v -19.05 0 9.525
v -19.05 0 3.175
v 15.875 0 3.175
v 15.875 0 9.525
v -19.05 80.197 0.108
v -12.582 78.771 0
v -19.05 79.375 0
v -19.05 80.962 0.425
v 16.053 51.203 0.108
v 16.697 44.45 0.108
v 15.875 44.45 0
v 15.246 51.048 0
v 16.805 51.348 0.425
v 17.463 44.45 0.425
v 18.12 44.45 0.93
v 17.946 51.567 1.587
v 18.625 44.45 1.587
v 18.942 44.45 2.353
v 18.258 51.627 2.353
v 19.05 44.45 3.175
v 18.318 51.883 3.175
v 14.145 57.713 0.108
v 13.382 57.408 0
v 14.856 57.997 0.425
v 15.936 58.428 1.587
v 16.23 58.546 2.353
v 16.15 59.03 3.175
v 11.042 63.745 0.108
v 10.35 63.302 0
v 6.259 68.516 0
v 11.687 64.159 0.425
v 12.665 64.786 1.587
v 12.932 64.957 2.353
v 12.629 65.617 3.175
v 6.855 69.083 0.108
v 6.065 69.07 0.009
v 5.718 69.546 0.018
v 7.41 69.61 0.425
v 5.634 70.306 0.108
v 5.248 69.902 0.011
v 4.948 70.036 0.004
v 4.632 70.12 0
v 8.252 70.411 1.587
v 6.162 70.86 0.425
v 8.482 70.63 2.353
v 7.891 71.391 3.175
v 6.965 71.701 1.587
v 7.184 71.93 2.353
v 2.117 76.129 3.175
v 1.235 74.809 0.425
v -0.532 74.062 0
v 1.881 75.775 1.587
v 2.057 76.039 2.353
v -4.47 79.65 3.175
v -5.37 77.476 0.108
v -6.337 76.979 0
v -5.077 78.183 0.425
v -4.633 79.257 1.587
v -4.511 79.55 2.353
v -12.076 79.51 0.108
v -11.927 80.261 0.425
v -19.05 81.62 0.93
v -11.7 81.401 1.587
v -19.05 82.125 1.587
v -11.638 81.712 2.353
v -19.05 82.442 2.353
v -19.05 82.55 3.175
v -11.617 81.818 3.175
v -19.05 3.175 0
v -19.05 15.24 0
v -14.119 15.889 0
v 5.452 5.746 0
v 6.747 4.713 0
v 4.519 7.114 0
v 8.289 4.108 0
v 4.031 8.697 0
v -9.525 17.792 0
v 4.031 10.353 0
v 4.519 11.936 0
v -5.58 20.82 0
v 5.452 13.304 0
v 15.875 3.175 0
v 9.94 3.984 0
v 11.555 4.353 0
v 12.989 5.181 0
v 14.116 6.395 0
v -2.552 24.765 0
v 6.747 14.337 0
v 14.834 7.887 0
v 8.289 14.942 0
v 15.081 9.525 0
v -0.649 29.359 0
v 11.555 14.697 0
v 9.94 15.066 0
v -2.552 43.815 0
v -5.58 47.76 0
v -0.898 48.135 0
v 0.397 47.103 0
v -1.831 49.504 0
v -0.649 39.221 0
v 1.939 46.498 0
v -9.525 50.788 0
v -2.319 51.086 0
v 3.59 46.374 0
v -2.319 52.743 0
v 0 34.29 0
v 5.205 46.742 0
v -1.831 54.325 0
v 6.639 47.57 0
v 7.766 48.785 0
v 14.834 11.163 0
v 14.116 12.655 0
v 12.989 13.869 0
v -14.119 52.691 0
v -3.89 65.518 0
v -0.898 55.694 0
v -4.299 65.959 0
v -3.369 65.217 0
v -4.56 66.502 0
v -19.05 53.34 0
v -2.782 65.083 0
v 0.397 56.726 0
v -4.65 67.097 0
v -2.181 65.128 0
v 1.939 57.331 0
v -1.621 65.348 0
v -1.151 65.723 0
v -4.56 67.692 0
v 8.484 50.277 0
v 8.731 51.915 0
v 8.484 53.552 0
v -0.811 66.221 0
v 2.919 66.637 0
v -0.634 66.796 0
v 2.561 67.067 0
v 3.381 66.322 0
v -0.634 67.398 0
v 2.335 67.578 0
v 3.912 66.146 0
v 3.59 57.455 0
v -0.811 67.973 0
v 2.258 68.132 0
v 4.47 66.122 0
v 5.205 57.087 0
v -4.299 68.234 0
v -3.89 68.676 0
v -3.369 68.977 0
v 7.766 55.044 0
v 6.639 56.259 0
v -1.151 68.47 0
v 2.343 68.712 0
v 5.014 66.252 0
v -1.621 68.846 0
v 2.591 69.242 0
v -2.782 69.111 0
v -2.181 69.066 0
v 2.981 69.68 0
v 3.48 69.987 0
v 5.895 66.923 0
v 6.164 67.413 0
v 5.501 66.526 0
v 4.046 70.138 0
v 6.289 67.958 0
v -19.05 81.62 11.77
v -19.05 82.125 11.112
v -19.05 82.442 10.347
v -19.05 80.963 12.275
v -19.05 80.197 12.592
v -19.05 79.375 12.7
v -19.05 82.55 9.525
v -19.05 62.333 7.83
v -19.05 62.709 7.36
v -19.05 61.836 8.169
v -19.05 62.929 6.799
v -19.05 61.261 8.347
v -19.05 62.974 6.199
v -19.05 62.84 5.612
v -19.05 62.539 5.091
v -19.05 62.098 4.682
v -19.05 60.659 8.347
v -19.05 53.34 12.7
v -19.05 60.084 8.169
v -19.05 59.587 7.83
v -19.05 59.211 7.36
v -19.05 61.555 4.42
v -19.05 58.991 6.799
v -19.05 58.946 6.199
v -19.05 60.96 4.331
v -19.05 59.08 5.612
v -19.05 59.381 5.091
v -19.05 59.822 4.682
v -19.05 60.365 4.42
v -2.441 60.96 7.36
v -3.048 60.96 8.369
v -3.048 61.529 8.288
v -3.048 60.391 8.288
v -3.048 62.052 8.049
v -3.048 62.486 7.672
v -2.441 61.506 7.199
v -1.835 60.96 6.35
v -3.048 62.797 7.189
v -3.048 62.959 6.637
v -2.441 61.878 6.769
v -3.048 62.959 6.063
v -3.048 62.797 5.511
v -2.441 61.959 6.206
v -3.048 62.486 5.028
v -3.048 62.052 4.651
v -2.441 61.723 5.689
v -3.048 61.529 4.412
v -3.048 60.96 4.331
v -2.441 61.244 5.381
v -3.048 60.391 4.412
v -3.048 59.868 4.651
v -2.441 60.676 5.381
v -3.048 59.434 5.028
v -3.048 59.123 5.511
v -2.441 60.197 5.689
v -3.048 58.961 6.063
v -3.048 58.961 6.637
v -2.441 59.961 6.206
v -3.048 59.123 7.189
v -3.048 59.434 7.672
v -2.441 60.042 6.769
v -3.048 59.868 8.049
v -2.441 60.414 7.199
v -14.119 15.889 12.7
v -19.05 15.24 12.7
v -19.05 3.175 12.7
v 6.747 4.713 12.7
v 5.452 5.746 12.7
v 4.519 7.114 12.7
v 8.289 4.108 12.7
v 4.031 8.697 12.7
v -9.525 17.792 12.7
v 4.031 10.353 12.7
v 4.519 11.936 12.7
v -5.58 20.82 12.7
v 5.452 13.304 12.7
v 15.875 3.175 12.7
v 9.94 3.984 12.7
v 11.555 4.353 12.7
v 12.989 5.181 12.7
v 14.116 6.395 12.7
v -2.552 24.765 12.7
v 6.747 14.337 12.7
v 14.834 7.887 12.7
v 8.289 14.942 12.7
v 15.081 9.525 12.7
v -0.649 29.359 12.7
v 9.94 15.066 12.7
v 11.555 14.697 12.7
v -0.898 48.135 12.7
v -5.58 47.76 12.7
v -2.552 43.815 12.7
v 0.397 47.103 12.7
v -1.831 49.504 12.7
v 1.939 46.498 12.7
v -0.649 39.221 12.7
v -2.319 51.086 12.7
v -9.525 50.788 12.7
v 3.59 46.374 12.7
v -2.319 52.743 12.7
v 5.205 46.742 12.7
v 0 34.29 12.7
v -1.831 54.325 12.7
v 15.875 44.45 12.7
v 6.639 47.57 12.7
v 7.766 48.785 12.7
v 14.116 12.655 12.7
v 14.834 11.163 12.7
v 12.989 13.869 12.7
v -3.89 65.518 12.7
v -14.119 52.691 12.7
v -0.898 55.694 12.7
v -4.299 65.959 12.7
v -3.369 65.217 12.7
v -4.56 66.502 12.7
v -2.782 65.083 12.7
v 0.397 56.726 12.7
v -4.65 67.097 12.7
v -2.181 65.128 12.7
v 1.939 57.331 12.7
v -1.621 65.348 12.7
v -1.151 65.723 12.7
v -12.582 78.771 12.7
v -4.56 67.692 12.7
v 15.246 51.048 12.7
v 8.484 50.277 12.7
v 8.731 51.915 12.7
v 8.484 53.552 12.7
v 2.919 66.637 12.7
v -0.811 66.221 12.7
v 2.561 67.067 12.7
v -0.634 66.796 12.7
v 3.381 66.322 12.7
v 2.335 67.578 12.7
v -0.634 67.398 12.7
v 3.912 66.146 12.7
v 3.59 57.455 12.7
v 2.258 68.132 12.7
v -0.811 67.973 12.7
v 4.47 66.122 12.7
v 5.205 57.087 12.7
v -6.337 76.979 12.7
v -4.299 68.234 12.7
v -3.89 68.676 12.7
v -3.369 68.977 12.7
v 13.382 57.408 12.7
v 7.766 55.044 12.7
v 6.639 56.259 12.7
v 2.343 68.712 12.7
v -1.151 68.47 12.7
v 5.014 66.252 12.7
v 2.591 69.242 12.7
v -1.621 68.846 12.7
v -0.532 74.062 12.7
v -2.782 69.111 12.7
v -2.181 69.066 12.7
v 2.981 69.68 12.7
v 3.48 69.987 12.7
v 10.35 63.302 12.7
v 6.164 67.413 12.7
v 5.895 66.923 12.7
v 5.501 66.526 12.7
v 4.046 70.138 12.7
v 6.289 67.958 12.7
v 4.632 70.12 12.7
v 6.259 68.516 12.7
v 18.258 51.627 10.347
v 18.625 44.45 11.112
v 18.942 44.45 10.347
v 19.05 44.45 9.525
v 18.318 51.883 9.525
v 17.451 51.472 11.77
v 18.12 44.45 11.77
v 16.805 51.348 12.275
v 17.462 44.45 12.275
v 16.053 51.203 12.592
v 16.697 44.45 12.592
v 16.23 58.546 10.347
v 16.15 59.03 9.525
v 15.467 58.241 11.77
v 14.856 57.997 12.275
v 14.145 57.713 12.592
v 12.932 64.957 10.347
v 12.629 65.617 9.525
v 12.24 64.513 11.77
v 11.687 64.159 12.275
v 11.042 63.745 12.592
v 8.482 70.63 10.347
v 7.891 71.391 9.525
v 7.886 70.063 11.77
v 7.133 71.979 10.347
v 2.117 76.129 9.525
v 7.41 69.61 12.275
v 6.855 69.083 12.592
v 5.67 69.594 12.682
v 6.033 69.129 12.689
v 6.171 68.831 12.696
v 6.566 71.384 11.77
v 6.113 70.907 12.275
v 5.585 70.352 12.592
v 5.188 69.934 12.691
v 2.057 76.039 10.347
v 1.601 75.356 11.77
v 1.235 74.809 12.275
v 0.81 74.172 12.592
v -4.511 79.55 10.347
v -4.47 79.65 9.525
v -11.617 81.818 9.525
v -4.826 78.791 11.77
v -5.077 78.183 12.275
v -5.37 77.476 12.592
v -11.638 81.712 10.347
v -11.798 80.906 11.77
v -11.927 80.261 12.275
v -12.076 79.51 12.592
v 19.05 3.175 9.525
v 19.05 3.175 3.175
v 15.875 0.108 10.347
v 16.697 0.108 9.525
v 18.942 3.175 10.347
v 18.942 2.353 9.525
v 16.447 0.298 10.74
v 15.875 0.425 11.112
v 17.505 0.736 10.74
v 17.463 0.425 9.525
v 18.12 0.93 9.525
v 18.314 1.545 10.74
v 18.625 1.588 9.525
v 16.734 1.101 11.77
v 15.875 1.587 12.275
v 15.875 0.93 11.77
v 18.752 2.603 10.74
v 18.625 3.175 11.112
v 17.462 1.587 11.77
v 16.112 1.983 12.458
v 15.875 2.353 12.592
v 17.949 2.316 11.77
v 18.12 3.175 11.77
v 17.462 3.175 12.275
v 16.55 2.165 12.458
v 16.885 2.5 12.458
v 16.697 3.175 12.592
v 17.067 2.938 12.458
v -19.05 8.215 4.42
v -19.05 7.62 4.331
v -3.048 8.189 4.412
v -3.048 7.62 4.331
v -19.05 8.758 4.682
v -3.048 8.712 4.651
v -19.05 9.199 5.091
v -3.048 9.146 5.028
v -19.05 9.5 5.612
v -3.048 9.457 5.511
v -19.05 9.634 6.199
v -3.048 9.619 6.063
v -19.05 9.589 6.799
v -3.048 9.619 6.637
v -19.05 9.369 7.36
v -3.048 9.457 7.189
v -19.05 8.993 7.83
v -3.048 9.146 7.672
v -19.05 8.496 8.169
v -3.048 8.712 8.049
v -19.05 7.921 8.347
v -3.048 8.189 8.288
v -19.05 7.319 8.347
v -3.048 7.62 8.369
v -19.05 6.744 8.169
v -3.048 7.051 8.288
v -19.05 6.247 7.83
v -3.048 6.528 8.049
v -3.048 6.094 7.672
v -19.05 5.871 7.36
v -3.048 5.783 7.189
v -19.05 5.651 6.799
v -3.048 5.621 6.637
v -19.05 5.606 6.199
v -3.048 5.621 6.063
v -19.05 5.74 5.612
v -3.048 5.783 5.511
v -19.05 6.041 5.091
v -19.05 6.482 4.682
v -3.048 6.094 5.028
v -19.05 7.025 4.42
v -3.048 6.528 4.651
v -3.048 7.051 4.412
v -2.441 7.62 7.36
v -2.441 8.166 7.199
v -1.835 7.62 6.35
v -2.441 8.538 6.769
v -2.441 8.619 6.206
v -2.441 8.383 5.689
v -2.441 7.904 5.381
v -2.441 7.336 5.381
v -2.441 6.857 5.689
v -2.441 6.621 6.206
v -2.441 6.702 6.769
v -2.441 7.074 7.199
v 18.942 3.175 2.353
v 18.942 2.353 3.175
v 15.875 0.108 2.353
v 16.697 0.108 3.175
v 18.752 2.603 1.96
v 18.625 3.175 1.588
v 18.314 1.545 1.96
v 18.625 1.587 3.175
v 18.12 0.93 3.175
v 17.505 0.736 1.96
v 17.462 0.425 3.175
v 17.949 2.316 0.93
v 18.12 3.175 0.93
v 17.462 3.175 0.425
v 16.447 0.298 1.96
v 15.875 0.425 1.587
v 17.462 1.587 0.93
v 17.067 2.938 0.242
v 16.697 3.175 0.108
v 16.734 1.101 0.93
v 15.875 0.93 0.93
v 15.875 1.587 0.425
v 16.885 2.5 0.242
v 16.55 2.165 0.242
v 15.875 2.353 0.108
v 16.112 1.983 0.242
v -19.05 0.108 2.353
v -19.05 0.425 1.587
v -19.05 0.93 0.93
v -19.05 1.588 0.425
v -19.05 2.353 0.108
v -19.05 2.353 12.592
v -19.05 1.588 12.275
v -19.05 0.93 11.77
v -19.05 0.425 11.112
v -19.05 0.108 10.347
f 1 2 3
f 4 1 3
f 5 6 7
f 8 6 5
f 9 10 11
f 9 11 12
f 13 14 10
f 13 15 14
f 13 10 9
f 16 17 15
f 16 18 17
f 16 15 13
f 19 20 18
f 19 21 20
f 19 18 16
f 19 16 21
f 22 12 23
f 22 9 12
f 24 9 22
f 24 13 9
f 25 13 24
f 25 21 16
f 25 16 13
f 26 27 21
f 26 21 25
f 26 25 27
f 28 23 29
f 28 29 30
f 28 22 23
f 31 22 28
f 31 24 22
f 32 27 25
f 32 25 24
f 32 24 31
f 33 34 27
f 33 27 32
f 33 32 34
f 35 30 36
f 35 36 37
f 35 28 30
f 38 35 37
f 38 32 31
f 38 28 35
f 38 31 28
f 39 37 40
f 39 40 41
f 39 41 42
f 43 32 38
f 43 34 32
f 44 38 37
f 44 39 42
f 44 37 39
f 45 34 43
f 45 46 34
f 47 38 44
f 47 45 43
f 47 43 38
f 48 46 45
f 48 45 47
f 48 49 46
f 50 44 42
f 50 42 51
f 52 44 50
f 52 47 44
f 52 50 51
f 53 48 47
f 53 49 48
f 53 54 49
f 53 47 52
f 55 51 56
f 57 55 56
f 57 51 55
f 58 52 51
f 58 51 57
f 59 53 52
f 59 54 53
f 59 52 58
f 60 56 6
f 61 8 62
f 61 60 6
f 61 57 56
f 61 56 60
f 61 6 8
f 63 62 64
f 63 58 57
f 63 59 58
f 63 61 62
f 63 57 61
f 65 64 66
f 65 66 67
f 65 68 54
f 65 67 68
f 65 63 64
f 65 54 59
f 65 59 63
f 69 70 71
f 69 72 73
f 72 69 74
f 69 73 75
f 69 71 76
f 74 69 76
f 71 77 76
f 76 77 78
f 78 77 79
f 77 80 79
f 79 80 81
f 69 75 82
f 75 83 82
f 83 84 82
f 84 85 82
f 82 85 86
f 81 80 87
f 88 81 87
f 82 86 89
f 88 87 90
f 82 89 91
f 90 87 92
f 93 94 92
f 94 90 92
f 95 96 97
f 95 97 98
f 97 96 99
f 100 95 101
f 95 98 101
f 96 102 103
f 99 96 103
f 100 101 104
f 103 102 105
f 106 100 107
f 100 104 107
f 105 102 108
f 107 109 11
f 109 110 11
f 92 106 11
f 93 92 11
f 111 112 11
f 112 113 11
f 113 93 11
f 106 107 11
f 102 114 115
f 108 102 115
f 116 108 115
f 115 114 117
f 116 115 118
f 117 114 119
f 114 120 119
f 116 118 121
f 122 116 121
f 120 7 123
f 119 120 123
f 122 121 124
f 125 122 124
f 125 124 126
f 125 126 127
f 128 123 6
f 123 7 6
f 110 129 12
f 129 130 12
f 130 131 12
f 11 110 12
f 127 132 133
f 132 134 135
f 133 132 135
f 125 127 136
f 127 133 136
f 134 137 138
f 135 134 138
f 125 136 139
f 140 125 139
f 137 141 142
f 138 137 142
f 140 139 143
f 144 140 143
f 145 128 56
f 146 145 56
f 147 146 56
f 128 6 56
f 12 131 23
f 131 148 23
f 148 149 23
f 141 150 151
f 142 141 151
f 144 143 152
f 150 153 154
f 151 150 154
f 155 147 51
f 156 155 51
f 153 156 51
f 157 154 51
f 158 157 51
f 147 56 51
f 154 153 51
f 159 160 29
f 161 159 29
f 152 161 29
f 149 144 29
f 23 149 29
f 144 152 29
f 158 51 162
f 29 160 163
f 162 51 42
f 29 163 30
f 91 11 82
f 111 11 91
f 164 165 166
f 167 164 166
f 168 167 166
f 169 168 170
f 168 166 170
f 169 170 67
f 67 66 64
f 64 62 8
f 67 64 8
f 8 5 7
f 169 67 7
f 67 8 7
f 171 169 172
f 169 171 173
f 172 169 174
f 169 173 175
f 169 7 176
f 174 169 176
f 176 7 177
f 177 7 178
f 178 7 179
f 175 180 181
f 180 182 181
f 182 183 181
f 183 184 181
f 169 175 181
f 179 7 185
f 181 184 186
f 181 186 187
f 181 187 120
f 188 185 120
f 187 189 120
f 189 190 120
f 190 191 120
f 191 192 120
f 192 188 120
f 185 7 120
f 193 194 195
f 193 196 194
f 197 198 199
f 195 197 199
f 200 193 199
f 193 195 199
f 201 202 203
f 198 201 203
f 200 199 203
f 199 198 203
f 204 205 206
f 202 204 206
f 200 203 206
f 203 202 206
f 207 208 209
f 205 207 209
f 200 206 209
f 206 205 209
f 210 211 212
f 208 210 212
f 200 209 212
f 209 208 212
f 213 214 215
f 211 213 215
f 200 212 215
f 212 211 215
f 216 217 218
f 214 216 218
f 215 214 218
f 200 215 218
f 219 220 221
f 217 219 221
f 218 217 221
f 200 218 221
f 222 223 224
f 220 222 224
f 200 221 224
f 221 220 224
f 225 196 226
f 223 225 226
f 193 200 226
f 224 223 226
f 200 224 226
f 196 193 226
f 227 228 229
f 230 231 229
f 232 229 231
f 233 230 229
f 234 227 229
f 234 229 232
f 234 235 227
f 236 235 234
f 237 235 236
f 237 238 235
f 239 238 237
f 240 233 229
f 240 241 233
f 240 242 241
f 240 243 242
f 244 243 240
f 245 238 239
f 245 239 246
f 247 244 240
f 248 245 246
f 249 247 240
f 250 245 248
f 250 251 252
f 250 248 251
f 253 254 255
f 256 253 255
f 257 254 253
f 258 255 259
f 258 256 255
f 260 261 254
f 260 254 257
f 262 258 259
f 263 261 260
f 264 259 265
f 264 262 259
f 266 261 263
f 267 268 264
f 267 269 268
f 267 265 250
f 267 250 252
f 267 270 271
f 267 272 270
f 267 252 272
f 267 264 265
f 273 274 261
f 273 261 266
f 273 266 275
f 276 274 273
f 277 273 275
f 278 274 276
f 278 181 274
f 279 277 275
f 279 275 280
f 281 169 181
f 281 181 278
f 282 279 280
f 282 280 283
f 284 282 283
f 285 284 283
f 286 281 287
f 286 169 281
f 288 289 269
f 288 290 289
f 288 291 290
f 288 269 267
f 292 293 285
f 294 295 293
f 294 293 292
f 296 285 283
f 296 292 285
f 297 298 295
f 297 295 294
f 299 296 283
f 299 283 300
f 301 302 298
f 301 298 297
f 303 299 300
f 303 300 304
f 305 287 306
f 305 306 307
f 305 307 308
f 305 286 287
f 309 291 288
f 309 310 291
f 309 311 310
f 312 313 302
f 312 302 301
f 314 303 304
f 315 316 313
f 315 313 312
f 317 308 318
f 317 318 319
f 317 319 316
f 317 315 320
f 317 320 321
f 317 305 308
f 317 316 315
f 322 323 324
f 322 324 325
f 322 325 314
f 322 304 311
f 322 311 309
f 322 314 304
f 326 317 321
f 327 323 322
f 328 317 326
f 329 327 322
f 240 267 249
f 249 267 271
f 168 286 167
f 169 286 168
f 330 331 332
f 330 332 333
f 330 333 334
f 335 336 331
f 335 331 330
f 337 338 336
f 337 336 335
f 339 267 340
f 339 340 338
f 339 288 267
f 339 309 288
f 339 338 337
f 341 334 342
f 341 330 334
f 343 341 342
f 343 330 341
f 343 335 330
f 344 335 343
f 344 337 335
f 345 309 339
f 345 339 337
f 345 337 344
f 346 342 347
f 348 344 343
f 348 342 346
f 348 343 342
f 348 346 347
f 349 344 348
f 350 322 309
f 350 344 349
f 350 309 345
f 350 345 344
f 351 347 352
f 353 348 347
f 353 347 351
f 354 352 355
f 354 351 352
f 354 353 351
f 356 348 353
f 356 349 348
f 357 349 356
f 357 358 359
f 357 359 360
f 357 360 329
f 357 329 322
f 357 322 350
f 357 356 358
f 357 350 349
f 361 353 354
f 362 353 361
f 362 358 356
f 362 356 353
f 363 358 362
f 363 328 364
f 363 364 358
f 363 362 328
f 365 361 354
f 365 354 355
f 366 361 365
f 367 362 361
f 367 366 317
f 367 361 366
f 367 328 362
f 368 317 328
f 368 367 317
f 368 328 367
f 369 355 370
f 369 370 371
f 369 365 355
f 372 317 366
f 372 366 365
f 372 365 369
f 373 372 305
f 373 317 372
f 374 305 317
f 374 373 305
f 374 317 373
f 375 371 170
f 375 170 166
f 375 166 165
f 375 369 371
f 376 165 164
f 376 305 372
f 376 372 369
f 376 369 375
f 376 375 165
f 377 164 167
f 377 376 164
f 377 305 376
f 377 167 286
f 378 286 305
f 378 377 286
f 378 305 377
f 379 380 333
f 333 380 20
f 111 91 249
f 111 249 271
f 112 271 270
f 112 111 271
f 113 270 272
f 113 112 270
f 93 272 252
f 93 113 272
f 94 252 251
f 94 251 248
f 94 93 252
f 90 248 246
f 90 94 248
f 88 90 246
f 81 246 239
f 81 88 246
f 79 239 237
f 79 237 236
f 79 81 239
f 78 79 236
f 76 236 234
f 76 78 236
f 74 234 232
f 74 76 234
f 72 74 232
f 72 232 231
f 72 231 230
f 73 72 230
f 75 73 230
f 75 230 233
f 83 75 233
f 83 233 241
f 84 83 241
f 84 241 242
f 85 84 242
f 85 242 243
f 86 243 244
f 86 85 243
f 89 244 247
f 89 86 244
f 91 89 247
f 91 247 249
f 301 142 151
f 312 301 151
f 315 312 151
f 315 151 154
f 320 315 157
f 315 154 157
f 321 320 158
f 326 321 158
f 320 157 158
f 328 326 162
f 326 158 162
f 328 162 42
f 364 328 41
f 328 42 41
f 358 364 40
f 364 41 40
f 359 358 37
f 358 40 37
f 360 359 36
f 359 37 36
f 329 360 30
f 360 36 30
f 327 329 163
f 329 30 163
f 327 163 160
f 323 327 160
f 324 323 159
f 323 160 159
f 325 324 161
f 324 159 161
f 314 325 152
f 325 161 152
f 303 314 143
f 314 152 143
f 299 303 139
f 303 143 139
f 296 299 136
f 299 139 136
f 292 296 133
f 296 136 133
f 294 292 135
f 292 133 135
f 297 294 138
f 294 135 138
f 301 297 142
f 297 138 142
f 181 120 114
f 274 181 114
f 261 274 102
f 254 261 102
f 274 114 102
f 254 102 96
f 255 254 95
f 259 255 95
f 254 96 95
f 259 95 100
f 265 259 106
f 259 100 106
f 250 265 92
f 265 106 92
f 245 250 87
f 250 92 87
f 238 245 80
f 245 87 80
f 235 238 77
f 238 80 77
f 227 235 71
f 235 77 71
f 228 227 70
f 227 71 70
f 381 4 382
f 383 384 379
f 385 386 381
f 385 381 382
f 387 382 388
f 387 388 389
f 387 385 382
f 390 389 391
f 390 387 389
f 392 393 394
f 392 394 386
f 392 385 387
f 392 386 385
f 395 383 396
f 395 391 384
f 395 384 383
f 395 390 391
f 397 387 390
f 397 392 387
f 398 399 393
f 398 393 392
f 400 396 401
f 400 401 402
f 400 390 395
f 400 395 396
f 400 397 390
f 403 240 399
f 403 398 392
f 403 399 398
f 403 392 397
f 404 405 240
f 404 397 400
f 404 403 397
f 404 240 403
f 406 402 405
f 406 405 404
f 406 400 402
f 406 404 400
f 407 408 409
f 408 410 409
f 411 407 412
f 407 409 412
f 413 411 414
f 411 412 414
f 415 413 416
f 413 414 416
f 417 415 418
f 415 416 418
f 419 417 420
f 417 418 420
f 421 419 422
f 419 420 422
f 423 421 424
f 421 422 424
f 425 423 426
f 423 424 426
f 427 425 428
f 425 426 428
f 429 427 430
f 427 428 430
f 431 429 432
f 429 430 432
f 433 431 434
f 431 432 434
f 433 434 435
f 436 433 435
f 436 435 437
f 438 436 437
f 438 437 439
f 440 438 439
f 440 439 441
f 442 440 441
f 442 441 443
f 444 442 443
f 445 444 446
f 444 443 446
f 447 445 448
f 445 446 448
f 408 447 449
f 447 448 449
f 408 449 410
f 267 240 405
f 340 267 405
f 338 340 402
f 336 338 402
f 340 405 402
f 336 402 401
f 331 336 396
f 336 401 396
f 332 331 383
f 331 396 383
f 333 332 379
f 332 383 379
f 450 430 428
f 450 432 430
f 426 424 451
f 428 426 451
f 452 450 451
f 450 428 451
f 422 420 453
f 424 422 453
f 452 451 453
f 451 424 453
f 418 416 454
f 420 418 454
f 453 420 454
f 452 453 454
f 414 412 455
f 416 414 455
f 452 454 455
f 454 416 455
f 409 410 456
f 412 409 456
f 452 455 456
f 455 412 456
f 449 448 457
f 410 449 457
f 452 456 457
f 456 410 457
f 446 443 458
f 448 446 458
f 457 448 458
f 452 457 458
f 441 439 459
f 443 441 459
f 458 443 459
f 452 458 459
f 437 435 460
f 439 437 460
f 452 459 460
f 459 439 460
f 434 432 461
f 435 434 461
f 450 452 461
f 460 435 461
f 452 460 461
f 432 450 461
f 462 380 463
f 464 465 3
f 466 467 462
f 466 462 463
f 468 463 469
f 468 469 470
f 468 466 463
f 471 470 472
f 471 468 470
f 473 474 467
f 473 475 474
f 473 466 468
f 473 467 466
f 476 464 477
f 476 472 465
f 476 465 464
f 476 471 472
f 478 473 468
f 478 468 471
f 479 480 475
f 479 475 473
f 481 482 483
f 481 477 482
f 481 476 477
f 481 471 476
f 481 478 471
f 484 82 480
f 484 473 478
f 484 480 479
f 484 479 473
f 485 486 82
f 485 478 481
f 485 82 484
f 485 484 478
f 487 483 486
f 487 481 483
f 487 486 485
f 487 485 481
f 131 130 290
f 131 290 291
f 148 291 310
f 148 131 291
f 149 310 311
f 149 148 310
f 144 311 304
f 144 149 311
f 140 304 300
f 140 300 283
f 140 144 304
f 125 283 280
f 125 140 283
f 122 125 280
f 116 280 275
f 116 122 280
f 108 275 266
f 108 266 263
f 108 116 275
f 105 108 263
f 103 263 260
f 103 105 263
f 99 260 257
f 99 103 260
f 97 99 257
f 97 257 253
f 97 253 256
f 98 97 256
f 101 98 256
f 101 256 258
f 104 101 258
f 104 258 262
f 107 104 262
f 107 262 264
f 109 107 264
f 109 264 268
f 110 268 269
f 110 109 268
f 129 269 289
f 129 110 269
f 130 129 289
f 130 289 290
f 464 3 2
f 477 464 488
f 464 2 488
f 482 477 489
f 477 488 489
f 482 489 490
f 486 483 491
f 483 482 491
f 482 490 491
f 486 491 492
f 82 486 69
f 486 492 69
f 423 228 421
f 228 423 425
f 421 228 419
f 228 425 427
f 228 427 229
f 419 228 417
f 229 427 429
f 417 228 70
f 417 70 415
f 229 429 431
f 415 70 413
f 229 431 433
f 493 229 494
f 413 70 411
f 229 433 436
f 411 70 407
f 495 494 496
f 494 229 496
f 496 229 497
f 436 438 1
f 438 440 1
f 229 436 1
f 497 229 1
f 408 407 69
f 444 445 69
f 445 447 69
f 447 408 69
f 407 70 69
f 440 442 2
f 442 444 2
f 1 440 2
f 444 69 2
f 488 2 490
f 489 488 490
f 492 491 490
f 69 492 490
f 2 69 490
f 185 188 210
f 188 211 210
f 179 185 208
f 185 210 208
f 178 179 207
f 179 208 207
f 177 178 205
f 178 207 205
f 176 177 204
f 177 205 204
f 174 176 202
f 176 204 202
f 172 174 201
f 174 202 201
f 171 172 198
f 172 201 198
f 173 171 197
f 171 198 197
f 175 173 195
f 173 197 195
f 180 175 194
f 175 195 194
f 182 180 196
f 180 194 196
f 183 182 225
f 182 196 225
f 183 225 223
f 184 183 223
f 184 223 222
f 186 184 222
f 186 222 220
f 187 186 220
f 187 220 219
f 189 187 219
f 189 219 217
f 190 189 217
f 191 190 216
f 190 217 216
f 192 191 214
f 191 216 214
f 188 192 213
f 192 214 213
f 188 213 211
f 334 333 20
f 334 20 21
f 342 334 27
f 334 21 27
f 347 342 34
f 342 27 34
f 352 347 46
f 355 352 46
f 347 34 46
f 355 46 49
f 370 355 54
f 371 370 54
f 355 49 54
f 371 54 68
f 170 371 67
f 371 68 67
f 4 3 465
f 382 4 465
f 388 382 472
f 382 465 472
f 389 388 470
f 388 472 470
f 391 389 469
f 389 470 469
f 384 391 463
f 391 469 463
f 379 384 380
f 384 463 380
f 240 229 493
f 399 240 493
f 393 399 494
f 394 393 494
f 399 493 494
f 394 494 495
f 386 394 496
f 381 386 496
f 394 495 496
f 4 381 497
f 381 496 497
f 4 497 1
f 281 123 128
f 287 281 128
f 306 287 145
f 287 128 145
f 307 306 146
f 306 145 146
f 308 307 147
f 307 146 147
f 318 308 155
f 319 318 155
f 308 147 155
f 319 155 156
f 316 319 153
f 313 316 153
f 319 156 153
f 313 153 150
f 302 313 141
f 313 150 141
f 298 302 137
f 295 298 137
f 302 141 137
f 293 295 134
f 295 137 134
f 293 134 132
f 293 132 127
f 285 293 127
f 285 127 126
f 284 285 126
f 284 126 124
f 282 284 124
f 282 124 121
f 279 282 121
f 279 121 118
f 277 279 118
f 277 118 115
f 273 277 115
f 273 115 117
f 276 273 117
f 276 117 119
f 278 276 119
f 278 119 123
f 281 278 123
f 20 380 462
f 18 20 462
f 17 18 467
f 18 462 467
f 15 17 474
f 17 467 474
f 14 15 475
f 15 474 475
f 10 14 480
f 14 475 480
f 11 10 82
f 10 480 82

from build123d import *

# Parameters (mm, degrees)
SKETCH1_R                  = 5.55625
BOSS_EXTRUDE1_DEPTH        = 12.7
F_10_32_TAPPED_HOLE2_D     = 4.0386
F_10_32_TAPPED_HOLE3_D     = 4.0386
F_10_32_TAPPED_HOLE3_DEPTH = 16.002
F_10_32_TAPPED_HOLE3_TIP   = 1.213317848
FILLET1_R                  = 3.175


with BuildPart() as part:
    # Sketch1 → Boss-Extrude1 (new body)
    with BuildSketch(Plane.XY):
        with BuildLine():
            Line((-19.05, 0), (19.05, 0))
            Line((19.05, 0), (19.05, 44.45))
            ThreePointArc((19.05, 44.45), (7.890768363, 71.390768363), (-19.05, 82.55))
            Line((-19.05, 82.55), (-19.05, 53.34))
            ThreePointArc((-19.05, 53.34), (0, 34.29), (-19.05, 15.24))
            Line((-19.05, 15.24), (-19.05, 0))
        make_face()
        with Locations((9.525, 9.525)):
            Circle(SKETCH1_R, mode=Mode.SUBTRACT)
        with Locations((3.175, 51.914520005)):
            Circle(SKETCH1_R, mode=Mode.SUBTRACT)
    extrude(amount=BOSS_EXTRUDE1_DEPTH)

    # #10-32 Tapped Hole2 (through all)
    with Locations(Plane.XY.offset(12.7)):
        with Locations((-2.630812741, 67.096934822), (4.277109037, 68.131749636)):
            Hole(F_10_32_TAPPED_HOLE2_D / 2)

    # #10-32 Tapped Hole3
    with Locations(Plane.ZY.offset(19.05)):
        with Locations((6.35, 7.62), (6.35, 60.96)):
            Hole(F_10_32_TAPPED_HOLE3_D / 2, depth=F_10_32_TAPPED_HOLE3_DEPTH)
            with Locations((0, 0, -(F_10_32_TAPPED_HOLE3_DEPTH + F_10_32_TAPPED_HOLE3_TIP / 2))):  # 118° drill point
                Cone(0, F_10_32_TAPPED_HOLE3_D / 2, F_10_32_TAPPED_HOLE3_TIP, mode=Mode.SUBTRACT)

    # Fillet1
    # the kernel refuses this fillet: 3.175 mm, written as the material it takes off along each edge
    with BuildSketch(Plane(origin=(15.875, 3.175, 9.525), x_dir=(0, -1, 0), z_dir=(0, 0, 1))) as fillet1_piece_1_section:
        Polygon((0, 0), (FILLET1_R * 1.02, 0), (FILLET1_R * 1.02, FILLET1_R * 1.02), (0, FILLET1_R * 1.02), align=None)
    fillet1_piece_1 = extrude(amount=FILLET1_R * 1.02, mode=Mode.PRIVATE)
    fillet1_piece_1 = fillet1_piece_1 - Plane(origin=(15.875, 3.175, 9.525), x_dir=(-0.7071067811865476, 0.7071067811865475, 0), z_dir=(0, 0, 1)) * Sphere(FILLET1_R, mode=Mode.PRIVATE)
    add(fillet1_piece_1, mode=Mode.SUBTRACT)
    with BuildSketch(Plane(origin=(15.875, 3.175, 3.175), x_dir=(0, -1, 0), z_dir=(0, 0, -1))) as fillet1_piece_2_section:
        Polygon((0, 0), (FILLET1_R * 1.02, 0), (FILLET1_R * 1.02, -FILLET1_R * 1.02), (0, -FILLET1_R * 1.02), align=None)
    fillet1_piece_2 = extrude(amount=FILLET1_R * 1.02, mode=Mode.PRIVATE)
    fillet1_piece_2 = fillet1_piece_2 - Plane(origin=(15.875, 3.175, 3.175), x_dir=(-0.7071067811865476, 0.7071067811865475, 0), z_dir=(0, 0, -1)) * Sphere(FILLET1_R, mode=Mode.PRIVATE)
    add(fillet1_piece_2, mode=Mode.SUBTRACT)
    with BuildSketch(Plane(origin=(19.05, 3.175, 12.7), x_dir=(-1, 0, 0), z_dir=(0, 1, 0))) as fillet1_piece_3:
        with BuildLine():
            CenterArc((FILLET1_R, -FILLET1_R), FILLET1_R, 90, 90)
            Line((0, -FILLET1_R), (-FILLET1_R * 0.02, -FILLET1_R))
            Line((-FILLET1_R * 0.02, -FILLET1_R), (-FILLET1_R * 0.02, FILLET1_R * 0.02))
            Line((-FILLET1_R * 0.02, FILLET1_R * 0.02), (FILLET1_R, FILLET1_R * 0.02))
            Line((FILLET1_R, FILLET1_R * 0.02), (FILLET1_R, 0))
        make_face()
    extrude(amount=41.275, mode=Mode.SUBTRACT)
    with BuildSketch(Plane(origin=(19.05, 0, 3.175), x_dir=(-1, 0, 0), z_dir=(0, 0, 1))) as fillet1_piece_4:
        with BuildLine():
            CenterArc((FILLET1_R, -FILLET1_R), FILLET1_R, 90, 90)
            Line((0, -FILLET1_R), (-FILLET1_R * 0.02, -FILLET1_R))
            Line((-FILLET1_R * 0.02, -FILLET1_R), (-FILLET1_R * 0.02, FILLET1_R * 0.02))
            Line((-FILLET1_R * 0.02, FILLET1_R * 0.02), (FILLET1_R, FILLET1_R * 0.02))
            Line((FILLET1_R, FILLET1_R * 0.02), (FILLET1_R, 0))
        make_face()
    extrude(amount=6.35, mode=Mode.SUBTRACT)
    with BuildSketch(Plane(origin=(-19.05, 44.45, 12.7), x_dir=(1, 0, 0), z_dir=(0, -1, 0))) as fillet1_piece_5:
        with BuildLine():
            CenterArc((38.1 - FILLET1_R, -FILLET1_R), FILLET1_R, 0, 90)
            Line((38.1, -FILLET1_R), (38.1 + FILLET1_R * 0.02, -FILLET1_R))
            Line((38.1 + FILLET1_R * 0.02, -FILLET1_R), (38.1 + FILLET1_R * 0.02, FILLET1_R * 0.02))
            Line((38.1 + FILLET1_R * 0.02, FILLET1_R * 0.02), (38.1 - FILLET1_R, FILLET1_R * 0.02))
            Line((38.1 - FILLET1_R, FILLET1_R * 0.02), (38.1 - FILLET1_R, 0))
        make_face()
    revolve(axis=Axis((-19.05, 44.45, 12.7), (0, 0, 1)), revolution_arc=90, mode=Mode.SUBTRACT)
    with BuildSketch(Plane(origin=(-19.05, 44.45, 0), x_dir=(1, 0, 0), z_dir=(0, -1, 0))) as fillet1_piece_6:
        with BuildLine():
            CenterArc((38.1 - FILLET1_R, FILLET1_R), FILLET1_R, 270, 90)
            Line((38.1, FILLET1_R), (38.1 + FILLET1_R * 0.02, FILLET1_R))
            Line((38.1 + FILLET1_R * 0.02, FILLET1_R), (38.1 + FILLET1_R * 0.02, -FILLET1_R * 0.02))
            Line((38.1 + FILLET1_R * 0.02, -FILLET1_R * 0.02), (38.1 - FILLET1_R, -FILLET1_R * 0.02))
            Line((38.1 - FILLET1_R, -FILLET1_R * 0.02), (38.1 - FILLET1_R, 0))
        make_face()
    revolve(axis=Axis((-19.05, 44.45, 0), (0, 0, 1)), revolution_arc=90, mode=Mode.SUBTRACT)
    with BuildSketch(Plane(origin=(-19.05, 0, 12.7), x_dir=(0, 1, 0), z_dir=(1, 0, 0))) as fillet1_piece_7:
        with BuildLine():
            CenterArc((FILLET1_R, -FILLET1_R), FILLET1_R, 90, 90)
            Line((0, -FILLET1_R), (-FILLET1_R * 0.02, -FILLET1_R))
            Line((-FILLET1_R * 0.02, -FILLET1_R), (-FILLET1_R * 0.02, FILLET1_R * 0.02))
            Line((-FILLET1_R * 0.02, FILLET1_R * 0.02), (FILLET1_R, FILLET1_R * 0.02))
            Line((FILLET1_R, FILLET1_R * 0.02), (FILLET1_R, 0))
        make_face()
    extrude(amount=34.925, mode=Mode.SUBTRACT)
    with BuildSketch(Plane(origin=(19.05, 3.175, 0), x_dir=(-1, 0, 0), z_dir=(0, 1, 0))) as fillet1_piece_8:
        with BuildLine():
            CenterArc((FILLET1_R, FILLET1_R), FILLET1_R, 180, 90)
            Line((0, FILLET1_R), (-FILLET1_R * 0.02, FILLET1_R))
            Line((-FILLET1_R * 0.02, FILLET1_R), (-FILLET1_R * 0.02, -FILLET1_R * 0.02))
            Line((-FILLET1_R * 0.02, -FILLET1_R * 0.02), (FILLET1_R, -FILLET1_R * 0.02))
            Line((FILLET1_R, -FILLET1_R * 0.02), (FILLET1_R, 0))
        make_face()
    extrude(amount=41.275, mode=Mode.SUBTRACT)
    with BuildSketch(Plane(origin=(-19.05, 0, 0), x_dir=(0, 1, 0), z_dir=(1, 0, 0))) as fillet1_piece_9:
        with BuildLine():
            CenterArc((FILLET1_R, FILLET1_R), FILLET1_R, 180, 90)
            Line((0, FILLET1_R), (-FILLET1_R * 0.02, FILLET1_R))
            Line((-FILLET1_R * 0.02, FILLET1_R), (-FILLET1_R * 0.02, -FILLET1_R * 0.02))
            Line((-FILLET1_R * 0.02, -FILLET1_R * 0.02), (FILLET1_R, -FILLET1_R * 0.02))
            Line((FILLET1_R, -FILLET1_R * 0.02), (FILLET1_R, 0))
        make_face()
    extrude(amount=34.925, mode=Mode.SUBTRACT)


solid = part.part
